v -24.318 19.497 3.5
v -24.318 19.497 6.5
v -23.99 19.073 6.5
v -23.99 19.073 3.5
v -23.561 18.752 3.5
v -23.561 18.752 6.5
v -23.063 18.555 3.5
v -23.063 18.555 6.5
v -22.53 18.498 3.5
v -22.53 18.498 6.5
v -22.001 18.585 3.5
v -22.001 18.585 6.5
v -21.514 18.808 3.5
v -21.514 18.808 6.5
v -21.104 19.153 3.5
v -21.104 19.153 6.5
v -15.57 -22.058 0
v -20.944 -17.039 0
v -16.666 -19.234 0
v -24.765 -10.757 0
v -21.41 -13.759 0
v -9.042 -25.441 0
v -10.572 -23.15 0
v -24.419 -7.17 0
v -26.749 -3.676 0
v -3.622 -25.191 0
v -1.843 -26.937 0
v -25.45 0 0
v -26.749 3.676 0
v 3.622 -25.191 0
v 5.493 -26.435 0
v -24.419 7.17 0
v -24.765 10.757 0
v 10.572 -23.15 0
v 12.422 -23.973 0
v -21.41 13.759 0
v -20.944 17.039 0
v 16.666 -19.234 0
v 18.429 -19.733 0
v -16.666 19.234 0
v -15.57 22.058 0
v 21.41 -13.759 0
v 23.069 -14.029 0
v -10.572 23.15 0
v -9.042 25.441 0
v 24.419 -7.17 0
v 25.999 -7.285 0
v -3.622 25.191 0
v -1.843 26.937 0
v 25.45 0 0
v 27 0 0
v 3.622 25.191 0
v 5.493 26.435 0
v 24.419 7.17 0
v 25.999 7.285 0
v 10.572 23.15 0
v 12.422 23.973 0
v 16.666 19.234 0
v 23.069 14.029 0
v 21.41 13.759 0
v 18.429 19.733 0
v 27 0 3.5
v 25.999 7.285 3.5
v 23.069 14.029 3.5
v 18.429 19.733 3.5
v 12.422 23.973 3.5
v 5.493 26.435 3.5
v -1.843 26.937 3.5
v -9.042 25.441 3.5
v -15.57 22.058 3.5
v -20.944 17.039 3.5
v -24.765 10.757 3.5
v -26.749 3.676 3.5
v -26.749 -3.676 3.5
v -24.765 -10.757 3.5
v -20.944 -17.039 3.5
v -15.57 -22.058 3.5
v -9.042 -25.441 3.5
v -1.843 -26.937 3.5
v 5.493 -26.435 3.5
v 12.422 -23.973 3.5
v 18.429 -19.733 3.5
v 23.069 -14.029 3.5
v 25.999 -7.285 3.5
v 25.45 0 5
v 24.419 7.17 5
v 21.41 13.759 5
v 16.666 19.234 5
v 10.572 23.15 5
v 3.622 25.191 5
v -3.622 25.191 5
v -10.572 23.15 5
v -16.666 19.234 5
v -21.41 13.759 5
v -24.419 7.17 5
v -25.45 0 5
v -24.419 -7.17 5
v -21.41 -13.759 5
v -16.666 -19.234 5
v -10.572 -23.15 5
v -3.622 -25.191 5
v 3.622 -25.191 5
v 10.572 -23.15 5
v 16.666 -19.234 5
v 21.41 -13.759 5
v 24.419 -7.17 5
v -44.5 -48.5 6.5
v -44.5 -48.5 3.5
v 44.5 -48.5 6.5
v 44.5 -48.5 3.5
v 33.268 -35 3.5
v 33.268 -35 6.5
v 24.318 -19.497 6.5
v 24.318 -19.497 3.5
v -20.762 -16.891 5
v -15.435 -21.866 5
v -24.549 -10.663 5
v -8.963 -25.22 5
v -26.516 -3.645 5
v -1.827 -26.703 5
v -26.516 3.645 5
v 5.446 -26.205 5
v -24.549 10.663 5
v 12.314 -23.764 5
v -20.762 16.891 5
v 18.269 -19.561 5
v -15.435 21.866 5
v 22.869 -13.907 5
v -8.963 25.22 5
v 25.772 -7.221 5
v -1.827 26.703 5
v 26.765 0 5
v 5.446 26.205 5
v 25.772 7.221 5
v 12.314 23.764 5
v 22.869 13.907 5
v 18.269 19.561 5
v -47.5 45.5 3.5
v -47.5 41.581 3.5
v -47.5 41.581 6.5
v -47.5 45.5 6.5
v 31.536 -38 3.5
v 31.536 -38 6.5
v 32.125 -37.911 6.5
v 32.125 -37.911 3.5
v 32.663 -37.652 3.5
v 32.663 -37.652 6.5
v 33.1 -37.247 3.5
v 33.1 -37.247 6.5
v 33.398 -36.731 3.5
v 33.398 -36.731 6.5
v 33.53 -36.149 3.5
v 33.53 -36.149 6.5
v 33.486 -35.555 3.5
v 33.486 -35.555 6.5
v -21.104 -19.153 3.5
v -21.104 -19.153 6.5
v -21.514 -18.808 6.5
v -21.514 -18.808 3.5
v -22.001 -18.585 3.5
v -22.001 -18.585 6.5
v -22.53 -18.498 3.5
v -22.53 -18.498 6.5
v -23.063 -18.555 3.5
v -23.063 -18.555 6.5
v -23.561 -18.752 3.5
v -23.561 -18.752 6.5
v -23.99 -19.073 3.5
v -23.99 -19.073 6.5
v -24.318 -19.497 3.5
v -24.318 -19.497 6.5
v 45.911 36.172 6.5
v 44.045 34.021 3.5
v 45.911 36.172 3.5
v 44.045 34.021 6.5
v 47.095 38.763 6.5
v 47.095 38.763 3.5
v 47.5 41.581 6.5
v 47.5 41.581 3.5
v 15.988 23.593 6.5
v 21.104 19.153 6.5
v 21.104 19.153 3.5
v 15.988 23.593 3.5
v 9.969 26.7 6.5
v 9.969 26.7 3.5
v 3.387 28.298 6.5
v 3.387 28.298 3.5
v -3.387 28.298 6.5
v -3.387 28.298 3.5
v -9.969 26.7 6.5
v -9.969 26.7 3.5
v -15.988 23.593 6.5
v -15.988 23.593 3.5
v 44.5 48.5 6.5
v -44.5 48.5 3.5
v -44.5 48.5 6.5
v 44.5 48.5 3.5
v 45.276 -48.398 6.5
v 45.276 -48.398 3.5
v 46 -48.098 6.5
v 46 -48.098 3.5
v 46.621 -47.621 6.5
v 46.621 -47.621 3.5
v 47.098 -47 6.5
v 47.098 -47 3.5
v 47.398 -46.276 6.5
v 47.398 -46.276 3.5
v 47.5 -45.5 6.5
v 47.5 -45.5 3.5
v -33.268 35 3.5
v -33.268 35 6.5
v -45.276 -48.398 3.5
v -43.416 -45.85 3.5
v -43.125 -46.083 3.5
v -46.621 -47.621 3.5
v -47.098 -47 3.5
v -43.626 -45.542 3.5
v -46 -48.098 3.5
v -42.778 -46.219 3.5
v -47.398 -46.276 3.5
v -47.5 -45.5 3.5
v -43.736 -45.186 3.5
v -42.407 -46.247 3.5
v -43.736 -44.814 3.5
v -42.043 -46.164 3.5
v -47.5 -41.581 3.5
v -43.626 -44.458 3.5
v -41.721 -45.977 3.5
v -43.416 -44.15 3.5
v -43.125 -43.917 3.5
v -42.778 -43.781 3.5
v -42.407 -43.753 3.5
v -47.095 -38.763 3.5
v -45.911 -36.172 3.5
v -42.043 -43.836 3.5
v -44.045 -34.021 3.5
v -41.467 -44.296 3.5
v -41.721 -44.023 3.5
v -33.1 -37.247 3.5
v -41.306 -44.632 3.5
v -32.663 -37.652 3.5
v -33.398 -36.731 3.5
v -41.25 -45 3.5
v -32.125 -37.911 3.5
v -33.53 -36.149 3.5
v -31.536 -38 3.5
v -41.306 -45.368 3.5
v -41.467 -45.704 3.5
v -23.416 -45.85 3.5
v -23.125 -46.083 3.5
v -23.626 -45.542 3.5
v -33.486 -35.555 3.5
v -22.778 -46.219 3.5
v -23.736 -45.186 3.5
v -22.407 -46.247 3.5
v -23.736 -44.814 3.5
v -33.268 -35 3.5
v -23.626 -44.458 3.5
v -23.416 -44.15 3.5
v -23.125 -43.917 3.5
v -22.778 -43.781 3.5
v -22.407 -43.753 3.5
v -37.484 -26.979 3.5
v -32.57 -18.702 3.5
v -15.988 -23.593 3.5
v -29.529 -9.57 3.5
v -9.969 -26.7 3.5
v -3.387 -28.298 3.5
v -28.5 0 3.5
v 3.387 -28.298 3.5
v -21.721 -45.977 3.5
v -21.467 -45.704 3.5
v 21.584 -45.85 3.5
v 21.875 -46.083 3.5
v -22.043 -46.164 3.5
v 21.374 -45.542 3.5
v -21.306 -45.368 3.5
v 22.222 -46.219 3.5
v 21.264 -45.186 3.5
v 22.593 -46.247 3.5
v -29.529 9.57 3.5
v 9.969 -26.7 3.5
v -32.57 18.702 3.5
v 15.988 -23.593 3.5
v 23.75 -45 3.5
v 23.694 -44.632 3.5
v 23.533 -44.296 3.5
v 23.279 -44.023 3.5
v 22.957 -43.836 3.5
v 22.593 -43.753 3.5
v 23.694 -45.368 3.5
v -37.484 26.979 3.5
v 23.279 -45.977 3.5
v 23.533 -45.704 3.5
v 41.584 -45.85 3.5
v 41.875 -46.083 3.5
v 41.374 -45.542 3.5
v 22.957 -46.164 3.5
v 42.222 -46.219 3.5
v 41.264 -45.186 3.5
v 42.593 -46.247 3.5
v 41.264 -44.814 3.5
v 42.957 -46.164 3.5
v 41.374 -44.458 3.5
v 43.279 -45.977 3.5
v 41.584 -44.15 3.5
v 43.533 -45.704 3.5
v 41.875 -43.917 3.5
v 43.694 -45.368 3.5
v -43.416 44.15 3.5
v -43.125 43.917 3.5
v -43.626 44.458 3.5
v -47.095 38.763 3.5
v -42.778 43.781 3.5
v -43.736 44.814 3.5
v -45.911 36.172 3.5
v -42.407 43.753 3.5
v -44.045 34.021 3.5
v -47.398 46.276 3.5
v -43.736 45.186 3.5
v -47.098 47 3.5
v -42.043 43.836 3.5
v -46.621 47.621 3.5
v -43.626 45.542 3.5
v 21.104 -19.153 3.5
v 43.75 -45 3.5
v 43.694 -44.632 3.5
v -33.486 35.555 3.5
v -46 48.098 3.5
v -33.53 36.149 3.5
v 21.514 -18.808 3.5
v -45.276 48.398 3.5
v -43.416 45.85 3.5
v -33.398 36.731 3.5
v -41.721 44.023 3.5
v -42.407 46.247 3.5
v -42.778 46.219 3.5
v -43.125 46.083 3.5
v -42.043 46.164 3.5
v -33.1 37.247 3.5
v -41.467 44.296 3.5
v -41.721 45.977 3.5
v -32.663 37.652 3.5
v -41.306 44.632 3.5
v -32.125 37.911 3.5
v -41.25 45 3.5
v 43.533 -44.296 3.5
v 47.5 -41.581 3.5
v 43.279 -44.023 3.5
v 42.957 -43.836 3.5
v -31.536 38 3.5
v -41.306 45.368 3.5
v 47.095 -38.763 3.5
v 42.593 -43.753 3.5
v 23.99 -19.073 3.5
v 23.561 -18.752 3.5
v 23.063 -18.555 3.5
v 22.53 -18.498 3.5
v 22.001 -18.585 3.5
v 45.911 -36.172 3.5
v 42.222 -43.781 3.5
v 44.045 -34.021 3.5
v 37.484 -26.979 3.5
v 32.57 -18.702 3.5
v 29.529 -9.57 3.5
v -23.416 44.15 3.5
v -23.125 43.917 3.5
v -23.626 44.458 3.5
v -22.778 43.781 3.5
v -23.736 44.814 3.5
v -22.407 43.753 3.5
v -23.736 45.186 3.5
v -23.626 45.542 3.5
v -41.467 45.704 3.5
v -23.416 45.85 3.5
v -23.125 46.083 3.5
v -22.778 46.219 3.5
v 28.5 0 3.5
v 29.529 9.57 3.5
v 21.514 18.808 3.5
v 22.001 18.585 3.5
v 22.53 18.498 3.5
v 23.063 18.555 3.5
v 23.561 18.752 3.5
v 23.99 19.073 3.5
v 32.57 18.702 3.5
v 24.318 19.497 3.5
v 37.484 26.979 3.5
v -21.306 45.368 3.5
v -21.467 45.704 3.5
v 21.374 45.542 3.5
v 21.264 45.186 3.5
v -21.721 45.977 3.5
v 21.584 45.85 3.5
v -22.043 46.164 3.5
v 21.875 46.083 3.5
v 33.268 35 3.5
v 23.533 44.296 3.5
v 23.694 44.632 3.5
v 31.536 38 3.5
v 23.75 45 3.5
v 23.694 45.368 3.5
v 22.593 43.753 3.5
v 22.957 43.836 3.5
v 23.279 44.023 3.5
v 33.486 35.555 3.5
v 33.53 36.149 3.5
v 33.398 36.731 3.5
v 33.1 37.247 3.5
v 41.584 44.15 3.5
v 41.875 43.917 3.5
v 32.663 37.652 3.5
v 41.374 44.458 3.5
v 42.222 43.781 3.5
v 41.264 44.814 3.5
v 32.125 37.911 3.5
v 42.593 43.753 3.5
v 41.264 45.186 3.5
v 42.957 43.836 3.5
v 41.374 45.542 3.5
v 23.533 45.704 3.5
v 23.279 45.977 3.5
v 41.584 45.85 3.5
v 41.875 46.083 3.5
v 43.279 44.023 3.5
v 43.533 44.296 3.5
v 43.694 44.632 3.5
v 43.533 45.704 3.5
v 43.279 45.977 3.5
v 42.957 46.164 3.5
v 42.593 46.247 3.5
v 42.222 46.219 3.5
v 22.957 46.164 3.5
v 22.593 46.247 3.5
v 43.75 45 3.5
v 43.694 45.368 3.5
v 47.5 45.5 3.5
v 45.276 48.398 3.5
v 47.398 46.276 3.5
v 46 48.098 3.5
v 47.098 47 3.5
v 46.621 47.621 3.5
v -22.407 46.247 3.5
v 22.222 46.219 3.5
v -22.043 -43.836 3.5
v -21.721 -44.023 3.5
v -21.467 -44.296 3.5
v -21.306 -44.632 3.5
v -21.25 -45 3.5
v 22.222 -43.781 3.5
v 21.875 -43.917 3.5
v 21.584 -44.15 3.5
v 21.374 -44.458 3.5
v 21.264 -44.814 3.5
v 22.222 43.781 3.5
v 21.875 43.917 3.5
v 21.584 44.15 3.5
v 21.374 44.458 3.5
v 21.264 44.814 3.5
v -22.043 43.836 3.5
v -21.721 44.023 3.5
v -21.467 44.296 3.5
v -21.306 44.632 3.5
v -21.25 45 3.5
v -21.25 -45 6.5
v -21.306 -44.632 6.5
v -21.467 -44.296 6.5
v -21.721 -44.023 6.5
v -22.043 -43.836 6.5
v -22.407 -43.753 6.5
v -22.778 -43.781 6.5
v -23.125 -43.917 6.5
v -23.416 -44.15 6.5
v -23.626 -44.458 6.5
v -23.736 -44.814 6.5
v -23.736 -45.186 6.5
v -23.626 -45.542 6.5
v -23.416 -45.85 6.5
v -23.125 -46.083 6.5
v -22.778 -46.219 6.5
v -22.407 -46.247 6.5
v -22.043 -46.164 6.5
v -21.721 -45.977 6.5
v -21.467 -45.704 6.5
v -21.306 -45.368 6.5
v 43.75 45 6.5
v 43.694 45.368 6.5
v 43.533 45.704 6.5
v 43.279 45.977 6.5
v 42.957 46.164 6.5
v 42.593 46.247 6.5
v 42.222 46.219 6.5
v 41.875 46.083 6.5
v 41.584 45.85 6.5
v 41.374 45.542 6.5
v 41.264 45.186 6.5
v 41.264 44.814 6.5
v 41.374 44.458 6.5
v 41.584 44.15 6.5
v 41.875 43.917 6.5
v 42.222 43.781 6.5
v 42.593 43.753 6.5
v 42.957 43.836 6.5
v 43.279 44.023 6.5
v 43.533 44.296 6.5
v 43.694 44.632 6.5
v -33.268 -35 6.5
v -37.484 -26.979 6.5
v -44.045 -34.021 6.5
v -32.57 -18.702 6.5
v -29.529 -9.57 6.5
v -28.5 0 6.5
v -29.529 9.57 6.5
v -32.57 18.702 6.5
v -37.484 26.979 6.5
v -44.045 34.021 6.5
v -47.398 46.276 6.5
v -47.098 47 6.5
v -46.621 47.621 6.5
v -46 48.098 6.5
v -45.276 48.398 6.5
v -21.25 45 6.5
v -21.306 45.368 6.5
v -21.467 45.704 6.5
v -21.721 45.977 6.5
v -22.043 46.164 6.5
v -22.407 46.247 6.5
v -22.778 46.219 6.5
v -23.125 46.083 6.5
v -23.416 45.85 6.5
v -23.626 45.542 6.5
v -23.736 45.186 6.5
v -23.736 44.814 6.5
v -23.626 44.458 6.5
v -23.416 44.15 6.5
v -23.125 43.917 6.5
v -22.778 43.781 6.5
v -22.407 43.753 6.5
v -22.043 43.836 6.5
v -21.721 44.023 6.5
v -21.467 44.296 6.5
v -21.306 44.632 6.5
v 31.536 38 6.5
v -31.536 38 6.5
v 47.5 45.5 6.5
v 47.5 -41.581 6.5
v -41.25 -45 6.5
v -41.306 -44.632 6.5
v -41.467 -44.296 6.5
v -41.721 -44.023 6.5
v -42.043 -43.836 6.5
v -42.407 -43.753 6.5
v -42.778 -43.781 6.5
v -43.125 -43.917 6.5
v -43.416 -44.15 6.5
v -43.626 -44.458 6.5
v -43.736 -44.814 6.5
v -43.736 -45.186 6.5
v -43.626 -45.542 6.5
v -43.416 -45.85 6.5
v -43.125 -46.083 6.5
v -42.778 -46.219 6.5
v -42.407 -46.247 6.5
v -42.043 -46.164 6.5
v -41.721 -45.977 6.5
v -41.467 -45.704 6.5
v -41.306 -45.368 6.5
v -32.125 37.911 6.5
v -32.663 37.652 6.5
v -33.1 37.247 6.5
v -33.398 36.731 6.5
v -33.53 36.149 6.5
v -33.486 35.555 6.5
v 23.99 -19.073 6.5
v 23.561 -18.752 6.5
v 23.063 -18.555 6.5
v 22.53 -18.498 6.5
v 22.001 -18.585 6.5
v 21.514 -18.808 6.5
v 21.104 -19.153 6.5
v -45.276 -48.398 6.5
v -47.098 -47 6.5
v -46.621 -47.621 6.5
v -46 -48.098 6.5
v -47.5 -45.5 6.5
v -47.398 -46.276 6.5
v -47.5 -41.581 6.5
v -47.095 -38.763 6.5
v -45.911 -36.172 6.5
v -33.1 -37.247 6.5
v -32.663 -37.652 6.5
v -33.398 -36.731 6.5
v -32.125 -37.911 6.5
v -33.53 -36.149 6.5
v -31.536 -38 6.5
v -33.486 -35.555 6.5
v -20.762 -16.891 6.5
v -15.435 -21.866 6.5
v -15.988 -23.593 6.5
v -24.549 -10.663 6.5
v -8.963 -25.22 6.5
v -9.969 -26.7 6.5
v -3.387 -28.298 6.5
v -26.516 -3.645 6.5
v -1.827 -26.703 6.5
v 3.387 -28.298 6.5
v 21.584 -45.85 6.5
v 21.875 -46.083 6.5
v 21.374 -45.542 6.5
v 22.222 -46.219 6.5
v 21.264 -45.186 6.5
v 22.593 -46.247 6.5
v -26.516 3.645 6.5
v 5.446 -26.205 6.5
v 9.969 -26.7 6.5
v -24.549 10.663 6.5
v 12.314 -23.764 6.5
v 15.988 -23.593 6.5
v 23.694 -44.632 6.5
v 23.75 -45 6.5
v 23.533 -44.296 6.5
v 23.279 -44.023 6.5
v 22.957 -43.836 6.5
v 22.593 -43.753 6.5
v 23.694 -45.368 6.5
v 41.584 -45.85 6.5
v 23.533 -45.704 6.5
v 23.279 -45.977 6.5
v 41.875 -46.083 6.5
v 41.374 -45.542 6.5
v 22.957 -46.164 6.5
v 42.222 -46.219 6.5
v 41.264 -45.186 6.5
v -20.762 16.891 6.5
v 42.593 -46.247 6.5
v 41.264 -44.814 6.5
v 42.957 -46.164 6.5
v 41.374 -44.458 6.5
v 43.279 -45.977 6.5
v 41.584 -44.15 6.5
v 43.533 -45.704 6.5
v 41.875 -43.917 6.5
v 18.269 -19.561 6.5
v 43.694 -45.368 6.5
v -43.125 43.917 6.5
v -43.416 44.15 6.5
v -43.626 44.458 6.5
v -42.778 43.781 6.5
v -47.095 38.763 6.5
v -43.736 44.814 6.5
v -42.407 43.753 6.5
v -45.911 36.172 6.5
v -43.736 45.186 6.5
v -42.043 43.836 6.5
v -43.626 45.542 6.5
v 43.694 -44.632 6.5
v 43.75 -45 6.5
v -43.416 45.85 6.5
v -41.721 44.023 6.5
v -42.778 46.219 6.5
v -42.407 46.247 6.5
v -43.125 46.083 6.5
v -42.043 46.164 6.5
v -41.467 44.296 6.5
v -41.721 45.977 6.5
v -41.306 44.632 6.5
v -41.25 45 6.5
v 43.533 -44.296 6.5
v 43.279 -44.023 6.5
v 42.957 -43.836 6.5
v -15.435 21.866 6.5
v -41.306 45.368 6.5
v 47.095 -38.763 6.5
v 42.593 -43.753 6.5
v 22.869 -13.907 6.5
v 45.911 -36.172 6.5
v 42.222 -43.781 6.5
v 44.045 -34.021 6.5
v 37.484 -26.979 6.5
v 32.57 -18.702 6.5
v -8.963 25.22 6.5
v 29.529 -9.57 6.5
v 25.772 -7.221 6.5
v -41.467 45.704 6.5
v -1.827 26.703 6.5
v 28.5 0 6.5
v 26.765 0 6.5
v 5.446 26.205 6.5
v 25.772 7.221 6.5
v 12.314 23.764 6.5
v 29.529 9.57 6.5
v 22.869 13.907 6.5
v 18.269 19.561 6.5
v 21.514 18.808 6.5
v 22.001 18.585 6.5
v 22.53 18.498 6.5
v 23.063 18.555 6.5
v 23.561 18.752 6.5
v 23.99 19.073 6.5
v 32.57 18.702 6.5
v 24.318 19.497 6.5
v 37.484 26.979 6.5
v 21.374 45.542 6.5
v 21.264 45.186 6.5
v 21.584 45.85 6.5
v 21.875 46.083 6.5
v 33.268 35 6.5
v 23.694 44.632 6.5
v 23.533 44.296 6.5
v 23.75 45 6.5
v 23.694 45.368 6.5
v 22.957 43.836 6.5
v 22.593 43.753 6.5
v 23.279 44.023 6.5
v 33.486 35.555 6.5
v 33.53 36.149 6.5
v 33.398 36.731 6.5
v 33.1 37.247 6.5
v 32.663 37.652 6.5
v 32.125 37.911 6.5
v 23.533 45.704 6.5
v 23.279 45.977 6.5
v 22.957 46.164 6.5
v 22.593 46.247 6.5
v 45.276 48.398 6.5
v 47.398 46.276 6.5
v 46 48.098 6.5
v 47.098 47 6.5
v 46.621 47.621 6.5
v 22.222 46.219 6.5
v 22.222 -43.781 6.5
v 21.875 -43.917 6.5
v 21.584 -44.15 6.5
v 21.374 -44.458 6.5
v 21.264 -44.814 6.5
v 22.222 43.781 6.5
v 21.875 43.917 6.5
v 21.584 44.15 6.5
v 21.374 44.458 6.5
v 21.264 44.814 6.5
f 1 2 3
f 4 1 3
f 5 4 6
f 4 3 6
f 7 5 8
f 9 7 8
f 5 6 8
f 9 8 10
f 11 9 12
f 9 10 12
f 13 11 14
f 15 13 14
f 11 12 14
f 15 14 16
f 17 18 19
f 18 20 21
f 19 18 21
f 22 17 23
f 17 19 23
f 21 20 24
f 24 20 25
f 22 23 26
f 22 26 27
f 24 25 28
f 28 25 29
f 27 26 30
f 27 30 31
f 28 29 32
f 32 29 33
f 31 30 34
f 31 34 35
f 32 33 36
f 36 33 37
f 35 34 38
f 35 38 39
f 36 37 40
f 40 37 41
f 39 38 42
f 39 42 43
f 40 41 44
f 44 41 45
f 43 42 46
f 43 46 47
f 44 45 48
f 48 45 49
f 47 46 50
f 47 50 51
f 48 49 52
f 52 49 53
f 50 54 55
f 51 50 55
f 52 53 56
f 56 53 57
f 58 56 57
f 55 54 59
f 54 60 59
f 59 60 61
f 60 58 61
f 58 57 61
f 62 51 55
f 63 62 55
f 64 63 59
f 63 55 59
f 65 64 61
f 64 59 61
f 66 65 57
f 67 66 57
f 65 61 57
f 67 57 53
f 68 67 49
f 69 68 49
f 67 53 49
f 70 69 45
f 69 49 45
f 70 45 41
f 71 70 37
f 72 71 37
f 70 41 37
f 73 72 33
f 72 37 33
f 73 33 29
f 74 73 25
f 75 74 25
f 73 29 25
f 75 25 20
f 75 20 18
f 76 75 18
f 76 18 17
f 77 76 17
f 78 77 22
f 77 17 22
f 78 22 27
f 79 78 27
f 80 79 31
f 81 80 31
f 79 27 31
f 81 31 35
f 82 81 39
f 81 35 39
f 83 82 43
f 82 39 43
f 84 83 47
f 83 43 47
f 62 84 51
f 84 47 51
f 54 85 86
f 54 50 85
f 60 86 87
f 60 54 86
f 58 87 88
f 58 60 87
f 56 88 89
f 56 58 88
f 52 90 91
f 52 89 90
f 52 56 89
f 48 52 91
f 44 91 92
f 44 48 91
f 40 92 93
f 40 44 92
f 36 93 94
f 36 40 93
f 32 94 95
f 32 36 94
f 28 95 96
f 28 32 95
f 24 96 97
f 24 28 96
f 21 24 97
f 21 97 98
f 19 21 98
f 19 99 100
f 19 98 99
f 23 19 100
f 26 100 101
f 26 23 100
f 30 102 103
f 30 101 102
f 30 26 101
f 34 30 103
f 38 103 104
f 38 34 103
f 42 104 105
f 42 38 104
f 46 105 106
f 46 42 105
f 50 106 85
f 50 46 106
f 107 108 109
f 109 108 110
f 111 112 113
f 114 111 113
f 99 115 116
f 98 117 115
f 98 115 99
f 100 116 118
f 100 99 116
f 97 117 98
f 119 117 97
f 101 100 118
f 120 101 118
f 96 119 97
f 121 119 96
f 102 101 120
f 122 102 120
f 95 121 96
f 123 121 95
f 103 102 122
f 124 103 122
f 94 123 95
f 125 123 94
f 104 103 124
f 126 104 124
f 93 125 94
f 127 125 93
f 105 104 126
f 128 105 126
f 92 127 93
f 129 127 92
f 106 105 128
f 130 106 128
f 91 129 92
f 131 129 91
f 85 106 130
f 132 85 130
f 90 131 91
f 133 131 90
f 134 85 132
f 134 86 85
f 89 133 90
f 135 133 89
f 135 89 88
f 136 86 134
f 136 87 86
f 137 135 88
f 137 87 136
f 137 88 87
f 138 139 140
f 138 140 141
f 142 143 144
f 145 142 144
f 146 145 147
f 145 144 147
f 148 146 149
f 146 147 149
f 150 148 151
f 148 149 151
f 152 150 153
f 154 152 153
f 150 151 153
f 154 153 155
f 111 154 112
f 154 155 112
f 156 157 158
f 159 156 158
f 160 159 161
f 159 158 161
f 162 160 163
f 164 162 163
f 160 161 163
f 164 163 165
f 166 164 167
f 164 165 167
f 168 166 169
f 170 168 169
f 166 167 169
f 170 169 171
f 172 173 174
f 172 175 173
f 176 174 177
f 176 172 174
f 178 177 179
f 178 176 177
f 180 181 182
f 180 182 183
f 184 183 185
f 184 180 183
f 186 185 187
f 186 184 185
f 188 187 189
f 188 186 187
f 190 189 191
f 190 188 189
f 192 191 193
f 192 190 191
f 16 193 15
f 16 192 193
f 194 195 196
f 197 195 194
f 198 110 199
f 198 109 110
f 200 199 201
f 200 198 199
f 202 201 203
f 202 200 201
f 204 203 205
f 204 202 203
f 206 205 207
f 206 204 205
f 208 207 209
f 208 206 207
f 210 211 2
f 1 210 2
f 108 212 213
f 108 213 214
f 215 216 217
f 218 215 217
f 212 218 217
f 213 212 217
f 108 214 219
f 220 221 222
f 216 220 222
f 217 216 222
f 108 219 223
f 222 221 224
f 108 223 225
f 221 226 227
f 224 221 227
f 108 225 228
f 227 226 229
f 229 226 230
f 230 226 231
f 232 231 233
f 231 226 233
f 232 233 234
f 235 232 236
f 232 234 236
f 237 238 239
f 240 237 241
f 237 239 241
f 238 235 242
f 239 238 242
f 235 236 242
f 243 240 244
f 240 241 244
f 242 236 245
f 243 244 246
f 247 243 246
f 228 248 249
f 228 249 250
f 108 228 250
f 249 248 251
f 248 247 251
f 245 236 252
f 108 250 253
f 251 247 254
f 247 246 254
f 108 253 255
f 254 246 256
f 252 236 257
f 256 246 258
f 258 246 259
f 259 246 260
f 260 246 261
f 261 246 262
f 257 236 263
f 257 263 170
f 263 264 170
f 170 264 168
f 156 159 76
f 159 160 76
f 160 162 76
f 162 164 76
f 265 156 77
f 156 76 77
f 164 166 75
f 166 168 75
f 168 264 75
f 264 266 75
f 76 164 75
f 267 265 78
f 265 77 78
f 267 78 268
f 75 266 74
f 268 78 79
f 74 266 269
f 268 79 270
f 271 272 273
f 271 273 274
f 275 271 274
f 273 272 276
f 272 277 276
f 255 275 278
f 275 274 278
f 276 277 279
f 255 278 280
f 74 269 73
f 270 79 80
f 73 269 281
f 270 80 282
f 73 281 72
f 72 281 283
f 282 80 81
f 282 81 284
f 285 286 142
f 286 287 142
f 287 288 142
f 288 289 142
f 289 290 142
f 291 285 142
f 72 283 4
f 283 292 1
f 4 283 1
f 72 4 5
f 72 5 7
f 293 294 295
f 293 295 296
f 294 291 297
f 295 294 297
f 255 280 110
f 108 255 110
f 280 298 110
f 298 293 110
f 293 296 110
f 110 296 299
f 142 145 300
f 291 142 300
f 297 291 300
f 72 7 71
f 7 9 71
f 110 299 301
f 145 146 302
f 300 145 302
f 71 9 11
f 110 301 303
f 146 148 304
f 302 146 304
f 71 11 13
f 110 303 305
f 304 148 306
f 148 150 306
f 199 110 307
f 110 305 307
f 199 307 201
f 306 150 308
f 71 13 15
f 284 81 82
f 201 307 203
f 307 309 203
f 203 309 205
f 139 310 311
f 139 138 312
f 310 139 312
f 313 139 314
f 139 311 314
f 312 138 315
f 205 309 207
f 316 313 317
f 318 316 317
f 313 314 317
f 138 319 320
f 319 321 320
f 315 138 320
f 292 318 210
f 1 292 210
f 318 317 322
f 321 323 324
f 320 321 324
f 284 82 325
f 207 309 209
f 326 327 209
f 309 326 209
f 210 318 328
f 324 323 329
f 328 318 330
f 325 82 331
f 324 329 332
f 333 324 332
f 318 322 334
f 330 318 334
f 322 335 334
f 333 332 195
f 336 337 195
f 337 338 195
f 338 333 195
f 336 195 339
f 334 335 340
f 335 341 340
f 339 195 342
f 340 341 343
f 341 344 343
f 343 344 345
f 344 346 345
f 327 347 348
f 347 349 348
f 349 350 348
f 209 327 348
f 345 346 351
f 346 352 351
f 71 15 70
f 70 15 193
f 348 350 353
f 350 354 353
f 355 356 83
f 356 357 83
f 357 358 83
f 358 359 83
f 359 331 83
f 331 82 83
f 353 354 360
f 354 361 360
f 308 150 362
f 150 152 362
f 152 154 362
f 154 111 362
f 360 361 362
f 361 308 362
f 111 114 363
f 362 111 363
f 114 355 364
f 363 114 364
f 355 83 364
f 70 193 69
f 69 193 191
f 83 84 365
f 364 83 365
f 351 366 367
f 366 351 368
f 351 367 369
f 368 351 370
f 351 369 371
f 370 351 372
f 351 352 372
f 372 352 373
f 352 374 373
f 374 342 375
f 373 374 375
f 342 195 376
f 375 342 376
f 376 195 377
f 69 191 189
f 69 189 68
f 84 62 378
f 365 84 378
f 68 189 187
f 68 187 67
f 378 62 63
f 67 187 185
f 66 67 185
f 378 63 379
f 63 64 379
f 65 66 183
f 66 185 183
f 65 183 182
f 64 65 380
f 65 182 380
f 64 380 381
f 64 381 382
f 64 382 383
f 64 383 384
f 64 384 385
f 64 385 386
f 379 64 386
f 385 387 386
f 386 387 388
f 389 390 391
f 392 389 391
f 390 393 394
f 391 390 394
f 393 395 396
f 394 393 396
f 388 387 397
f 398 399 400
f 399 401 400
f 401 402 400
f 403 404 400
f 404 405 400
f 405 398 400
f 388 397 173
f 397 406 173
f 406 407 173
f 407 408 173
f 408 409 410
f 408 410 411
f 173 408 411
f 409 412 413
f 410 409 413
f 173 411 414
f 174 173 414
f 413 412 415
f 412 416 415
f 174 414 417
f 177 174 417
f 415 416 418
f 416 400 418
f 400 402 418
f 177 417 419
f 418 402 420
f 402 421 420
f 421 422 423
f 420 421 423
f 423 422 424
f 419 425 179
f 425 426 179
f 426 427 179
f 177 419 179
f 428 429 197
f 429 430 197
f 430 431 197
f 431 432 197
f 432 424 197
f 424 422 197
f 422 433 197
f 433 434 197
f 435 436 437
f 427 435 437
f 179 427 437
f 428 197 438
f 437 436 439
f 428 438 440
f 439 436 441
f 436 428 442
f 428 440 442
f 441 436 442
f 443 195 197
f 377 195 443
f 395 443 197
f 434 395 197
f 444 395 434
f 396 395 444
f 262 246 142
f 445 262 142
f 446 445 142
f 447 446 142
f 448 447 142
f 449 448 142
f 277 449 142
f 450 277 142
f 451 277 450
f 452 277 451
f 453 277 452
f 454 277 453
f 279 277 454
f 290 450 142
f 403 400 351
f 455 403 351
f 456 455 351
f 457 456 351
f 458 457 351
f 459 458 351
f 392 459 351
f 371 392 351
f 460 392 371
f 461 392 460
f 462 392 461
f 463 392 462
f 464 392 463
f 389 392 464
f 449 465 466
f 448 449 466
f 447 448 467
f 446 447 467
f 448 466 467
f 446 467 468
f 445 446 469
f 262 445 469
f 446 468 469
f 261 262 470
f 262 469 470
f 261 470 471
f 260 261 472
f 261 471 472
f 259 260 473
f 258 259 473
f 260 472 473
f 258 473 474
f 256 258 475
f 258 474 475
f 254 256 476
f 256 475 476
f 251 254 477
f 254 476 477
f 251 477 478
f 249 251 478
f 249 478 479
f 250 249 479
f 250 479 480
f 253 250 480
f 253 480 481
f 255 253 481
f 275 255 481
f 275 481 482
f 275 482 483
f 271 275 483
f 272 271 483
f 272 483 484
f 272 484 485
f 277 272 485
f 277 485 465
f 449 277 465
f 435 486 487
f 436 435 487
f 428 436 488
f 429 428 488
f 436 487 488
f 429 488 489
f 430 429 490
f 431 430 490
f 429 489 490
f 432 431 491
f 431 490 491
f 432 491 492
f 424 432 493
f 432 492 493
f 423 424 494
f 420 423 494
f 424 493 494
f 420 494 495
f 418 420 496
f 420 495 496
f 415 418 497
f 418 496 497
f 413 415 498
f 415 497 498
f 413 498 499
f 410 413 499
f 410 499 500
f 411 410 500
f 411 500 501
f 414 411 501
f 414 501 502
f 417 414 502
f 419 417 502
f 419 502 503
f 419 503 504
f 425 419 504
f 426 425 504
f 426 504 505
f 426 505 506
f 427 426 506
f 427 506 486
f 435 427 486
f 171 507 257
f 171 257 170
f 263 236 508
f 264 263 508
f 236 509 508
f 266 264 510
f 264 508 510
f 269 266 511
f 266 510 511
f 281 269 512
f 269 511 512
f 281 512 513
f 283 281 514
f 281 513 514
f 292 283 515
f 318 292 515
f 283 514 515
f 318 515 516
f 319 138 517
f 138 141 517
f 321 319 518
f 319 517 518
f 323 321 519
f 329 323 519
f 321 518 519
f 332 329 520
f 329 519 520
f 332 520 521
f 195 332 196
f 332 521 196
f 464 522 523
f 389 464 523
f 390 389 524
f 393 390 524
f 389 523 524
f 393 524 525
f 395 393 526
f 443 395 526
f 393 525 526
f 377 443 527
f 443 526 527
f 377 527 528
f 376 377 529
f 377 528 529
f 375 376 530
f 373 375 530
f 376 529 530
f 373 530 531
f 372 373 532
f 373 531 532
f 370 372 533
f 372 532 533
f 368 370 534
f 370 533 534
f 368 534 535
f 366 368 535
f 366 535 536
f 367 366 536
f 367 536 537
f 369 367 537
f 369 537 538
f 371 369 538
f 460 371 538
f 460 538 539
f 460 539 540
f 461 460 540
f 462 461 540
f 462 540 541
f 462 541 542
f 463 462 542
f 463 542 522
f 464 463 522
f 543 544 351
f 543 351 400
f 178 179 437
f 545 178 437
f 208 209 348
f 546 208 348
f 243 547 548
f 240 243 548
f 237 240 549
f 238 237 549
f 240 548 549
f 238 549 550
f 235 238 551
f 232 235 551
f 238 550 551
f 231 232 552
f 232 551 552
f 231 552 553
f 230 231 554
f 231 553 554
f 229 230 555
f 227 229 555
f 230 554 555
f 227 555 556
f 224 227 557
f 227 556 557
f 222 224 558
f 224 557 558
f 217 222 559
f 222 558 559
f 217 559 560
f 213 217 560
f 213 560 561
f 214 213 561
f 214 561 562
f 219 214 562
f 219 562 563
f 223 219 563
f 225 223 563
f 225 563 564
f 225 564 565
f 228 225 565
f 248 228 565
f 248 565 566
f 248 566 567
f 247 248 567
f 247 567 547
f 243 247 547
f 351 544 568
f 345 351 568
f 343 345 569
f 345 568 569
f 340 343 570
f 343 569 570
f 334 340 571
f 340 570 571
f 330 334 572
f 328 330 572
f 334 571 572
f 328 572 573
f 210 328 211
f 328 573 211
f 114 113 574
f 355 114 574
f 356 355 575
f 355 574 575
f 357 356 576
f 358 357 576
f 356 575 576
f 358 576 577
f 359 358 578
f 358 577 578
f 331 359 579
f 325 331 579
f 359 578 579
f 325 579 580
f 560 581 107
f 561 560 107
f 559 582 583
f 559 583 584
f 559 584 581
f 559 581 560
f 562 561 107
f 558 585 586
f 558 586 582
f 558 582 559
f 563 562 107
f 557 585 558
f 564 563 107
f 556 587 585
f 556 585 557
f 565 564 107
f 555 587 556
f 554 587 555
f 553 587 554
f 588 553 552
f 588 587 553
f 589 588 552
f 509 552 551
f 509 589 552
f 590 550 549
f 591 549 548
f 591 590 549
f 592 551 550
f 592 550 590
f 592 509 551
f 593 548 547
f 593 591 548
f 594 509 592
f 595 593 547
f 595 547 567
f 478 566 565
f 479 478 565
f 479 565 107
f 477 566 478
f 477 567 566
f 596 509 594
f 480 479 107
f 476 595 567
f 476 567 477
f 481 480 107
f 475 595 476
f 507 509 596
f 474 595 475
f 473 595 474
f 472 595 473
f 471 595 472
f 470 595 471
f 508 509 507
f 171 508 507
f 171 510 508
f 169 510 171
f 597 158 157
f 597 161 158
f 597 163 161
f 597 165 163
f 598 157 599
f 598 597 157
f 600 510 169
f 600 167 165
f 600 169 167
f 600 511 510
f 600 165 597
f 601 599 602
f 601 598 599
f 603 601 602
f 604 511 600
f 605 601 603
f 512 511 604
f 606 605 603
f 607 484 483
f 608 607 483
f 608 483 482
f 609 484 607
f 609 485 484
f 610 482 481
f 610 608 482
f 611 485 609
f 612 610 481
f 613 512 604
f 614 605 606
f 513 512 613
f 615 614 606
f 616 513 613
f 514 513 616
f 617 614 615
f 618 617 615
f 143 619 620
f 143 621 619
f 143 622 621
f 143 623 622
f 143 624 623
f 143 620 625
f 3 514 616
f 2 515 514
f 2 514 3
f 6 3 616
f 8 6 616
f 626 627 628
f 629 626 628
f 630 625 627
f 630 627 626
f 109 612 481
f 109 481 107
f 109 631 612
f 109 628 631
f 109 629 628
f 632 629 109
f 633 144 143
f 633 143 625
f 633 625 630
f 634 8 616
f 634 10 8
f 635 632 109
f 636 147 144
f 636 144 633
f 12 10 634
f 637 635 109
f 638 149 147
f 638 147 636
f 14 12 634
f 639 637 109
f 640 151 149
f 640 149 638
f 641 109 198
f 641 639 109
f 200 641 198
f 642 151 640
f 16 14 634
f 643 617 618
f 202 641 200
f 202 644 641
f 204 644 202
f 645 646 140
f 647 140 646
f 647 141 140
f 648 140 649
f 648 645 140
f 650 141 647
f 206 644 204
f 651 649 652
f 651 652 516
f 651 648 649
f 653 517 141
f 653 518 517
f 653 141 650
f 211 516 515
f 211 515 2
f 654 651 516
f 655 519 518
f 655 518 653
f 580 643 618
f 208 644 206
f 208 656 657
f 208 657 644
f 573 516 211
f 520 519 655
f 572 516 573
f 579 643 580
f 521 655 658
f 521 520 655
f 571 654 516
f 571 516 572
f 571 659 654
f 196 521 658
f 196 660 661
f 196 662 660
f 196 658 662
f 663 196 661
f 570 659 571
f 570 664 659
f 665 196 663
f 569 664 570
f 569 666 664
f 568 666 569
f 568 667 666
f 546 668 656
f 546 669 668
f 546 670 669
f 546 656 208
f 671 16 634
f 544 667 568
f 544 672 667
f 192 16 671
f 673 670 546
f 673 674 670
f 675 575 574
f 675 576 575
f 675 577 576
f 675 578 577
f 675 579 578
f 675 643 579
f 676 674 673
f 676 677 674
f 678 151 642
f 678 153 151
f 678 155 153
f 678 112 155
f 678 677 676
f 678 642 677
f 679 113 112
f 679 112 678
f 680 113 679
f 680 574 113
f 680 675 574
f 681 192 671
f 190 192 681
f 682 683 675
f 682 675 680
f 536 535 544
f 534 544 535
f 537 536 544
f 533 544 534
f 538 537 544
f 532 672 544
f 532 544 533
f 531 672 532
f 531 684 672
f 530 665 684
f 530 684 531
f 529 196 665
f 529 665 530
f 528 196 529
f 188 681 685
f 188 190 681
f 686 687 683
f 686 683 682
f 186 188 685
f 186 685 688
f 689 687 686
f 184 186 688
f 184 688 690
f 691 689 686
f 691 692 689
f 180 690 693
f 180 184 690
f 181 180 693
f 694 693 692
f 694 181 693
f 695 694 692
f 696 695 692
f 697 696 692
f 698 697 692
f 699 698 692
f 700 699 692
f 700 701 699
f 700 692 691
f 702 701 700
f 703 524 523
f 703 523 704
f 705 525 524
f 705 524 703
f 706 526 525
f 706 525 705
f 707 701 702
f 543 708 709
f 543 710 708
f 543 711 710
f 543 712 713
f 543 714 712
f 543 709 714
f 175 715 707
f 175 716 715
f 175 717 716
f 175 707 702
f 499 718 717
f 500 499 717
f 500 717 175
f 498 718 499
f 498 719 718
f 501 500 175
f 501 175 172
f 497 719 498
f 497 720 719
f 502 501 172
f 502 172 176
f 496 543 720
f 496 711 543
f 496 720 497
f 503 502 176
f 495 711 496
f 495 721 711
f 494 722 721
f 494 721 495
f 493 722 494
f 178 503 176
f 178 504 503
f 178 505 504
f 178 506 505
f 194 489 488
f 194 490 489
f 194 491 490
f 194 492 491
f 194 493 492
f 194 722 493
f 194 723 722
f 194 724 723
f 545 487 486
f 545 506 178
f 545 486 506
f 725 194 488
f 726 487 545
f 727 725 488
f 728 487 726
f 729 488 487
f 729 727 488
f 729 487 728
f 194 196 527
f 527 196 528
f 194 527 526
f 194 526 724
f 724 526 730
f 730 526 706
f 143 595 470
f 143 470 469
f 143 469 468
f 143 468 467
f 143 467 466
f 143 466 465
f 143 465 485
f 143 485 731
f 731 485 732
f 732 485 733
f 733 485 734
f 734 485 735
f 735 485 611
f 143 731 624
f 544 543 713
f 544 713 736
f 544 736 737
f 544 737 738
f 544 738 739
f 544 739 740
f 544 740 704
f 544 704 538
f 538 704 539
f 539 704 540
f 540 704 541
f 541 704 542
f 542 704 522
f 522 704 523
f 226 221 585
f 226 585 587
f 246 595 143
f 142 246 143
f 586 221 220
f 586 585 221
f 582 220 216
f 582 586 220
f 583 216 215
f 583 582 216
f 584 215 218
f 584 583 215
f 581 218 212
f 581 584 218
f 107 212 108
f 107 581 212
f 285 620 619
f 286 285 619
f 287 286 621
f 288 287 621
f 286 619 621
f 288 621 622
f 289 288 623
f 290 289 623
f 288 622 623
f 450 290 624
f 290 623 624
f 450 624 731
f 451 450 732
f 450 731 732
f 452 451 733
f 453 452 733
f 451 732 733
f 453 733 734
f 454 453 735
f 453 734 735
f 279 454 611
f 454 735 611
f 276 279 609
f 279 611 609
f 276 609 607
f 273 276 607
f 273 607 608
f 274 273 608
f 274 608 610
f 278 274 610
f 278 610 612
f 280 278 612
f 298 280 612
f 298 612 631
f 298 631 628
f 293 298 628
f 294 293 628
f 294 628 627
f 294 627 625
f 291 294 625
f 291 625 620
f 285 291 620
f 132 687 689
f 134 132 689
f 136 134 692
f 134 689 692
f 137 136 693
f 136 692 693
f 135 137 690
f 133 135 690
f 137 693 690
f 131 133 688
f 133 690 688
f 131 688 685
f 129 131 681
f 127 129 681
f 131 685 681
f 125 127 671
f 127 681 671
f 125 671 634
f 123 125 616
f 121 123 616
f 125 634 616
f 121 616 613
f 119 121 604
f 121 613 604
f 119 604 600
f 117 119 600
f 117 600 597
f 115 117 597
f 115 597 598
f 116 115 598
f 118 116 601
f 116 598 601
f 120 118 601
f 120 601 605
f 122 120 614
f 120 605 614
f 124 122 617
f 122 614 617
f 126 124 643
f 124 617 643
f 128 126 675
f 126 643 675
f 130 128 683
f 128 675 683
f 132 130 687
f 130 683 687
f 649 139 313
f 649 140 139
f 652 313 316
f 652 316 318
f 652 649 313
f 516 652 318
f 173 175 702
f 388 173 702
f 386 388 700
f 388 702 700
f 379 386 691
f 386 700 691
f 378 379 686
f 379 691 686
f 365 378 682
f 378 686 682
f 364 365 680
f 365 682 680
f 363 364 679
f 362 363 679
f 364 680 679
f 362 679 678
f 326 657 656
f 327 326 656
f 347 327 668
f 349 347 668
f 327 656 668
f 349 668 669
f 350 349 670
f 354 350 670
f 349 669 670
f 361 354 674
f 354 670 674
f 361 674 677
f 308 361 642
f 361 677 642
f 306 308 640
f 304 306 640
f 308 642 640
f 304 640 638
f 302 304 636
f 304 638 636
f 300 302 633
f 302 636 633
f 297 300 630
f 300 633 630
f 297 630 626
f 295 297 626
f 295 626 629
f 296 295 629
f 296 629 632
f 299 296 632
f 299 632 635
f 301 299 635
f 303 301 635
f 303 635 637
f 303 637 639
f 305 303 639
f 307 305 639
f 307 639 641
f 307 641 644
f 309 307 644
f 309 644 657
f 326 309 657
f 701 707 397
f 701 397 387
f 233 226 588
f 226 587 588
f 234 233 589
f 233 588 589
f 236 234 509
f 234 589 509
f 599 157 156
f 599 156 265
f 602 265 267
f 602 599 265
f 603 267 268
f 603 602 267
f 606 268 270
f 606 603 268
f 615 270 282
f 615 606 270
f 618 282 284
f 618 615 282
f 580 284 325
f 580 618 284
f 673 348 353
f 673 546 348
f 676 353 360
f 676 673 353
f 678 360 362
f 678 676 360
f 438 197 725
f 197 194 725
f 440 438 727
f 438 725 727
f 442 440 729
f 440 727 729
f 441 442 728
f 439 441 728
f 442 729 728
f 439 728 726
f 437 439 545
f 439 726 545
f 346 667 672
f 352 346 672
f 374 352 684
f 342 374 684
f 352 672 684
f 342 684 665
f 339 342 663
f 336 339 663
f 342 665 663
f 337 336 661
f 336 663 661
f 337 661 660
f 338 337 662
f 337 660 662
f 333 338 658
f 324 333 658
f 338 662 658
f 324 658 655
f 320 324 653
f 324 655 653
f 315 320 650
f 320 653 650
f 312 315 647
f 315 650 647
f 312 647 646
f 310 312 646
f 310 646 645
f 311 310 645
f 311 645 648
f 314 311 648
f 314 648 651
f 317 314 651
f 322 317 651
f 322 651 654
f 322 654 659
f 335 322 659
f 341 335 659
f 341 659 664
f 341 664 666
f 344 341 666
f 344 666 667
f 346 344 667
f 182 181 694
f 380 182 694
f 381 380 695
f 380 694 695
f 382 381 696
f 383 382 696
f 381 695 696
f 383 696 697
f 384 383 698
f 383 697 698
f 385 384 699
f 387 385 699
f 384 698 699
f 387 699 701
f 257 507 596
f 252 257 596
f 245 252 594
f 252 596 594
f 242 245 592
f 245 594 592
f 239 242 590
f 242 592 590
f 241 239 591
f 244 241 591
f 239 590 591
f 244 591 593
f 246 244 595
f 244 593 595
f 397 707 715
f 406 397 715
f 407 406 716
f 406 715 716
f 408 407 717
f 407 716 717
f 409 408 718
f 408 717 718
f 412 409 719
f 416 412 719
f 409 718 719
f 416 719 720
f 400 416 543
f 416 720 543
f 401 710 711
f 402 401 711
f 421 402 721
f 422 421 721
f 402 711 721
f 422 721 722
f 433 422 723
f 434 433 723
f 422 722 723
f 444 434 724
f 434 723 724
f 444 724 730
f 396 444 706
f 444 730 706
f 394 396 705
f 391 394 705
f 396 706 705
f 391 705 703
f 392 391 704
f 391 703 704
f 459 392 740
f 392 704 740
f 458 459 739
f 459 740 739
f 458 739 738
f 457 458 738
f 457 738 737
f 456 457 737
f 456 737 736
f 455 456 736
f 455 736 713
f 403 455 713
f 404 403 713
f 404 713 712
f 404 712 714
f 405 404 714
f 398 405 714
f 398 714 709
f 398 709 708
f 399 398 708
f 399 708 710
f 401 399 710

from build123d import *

# Parameters (mm, degrees)
SKETCH006_R     = 27
SKETCH006_R_2   = 25.45
PAD003_DEPTH    = 3.5
SKETCH007_W     = 95
SKETCH007_H     = 97
SKETCH007_R     = 25.45
PAD004_DEPTH    = 3
SKETCH008_R     = 26.765
POCKET_DEPTH    = 1.5
SKETCH009_R     = 1.25
POCKET001_DEPTH = 6.501
SKETCH010_R     = 45
POCKET002_DEPTH = 6.501
FILLET_R        = 10
FILLET001_R     = 3


with BuildPart() as part:
    # Sketch006 → Pad003 (new body)
    with BuildSketch(Plane.XY):
        Circle(SKETCH006_R)
        Circle(SKETCH006_R_2, mode=Mode.SUBTRACT)
    extrude(amount=PAD003_DEPTH)

    # Sketch007 (on Face4 of Pad003) → Pad004 (join)
    with BuildSketch(Plane.XY.offset(3.5)):
        Rectangle(SKETCH007_W, SKETCH007_H)
        Circle(SKETCH007_R, mode=Mode.SUBTRACT)
    extrude(amount=PAD004_DEPTH)

    # Sketch008 (on Face10 of Pad004) → Pocket (cut)
    with BuildSketch(Plane.XY.offset(6.5)):
        Circle(SKETCH008_R)
    extrude(amount=-POCKET_DEPTH, mode=Mode.SUBTRACT)

    # Sketch009 (on Face10 of Pocket) → Pocket001 (cut, through all)
    with BuildSketch(Plane.XY.offset(6.5)):
        with Locations((-42.5, 45)):
            Circle(SKETCH009_R)
        with Locations((42.5, 45)):
            Circle(SKETCH009_R)
        with Locations((42.5, -45)):
            Circle(SKETCH009_R)
        with Locations((-42.5, -45)):
            Circle(SKETCH009_R)
        with Locations((-22.5, 45)):
            Circle(SKETCH009_R)
        with Locations((22.5, 45)):
            Circle(SKETCH009_R)
        with Locations((-22.5, -45)):
            Circle(SKETCH009_R)
        with Locations((22.5, -45)):
            Circle(SKETCH009_R)
    extrude(amount=-POCKET001_DEPTH, mode=Mode.SUBTRACT)

    # Sketch010 (on Face18 of Pocket001) → Pocket002 (cut, through all)
    with BuildSketch(Plane.XY.offset(6.5)):
        with Locations((-73.5, 0)):
            Circle(SKETCH010_R)
        with Locations((73.5, 0)):
            Circle(SKETCH010_R)
        with BuildLine():
            Line((-31.535898, 38), (31.535898, 38))
            ThreePointArc((33.267949, 35), (33.267949, 37), (31.535898, 38))
            Line((33.267949, 35), (24.317547, 19.497448))
            ThreePointArc((21.10448, 19.153353), (22.798463, 18.508819), (24.317547, 19.497448))
            ThreePointArc((21.10448, 19.153353), (0, 28.5), (-21.10448, 19.153353))
            ThreePointArc((-24.317547, 19.497448), (-22.798463, 18.508819), (-21.10448, 19.153353))
            Line((-33.267949, 35), (-24.317547, 19.497448))
            ThreePointArc((-31.535898, 38), (-33.267949, 37), (-33.267949, 35))
        make_face()
        with BuildLine():
            Line((-31.535898, -38), (31.535898, -38))
            ThreePointArc((31.535898, -38), (33.267949, -37), (33.267949, -35))
            Line((33.267949, -35), (24.317547, -19.497448))
            ThreePointArc((24.317547, -19.497448), (22.798463, -18.508819), (21.10448, -19.153353))
            ThreePointArc((-21.10448, -19.153353), (0, -28.5), (21.10448, -19.153353))
            ThreePointArc((-21.10448, -19.153353), (-22.798463, -18.508819), (-24.317547, -19.497448))
            Line((-33.267949, -35), (-24.317547, -19.497448))
            ThreePointArc((-33.267949, -35), (-33.267949, -37), (-31.535898, -38))
        make_face()
    extrude(amount=-POCKET002_DEPTH, mode=Mode.SUBTRACT)

    # Fillet
    fillet_edges = [part.edges().sort_by_distance(p)[0] for p in [
        (47.5, -36.728735, 5),
        (47.5, 36.728735, 5),
        (-47.5, -36.728735, 5),
        (-47.5, 36.728735, 5),
    ]]
    fillet(fillet_edges, radius=FILLET_R)

    # Fillet001
    fillet001_edges = [part.edges().sort_by_distance(p)[0] for p in [
        (-47.5, 48.5, 5),
        (-47.5, -48.5, 5),
        (47.5, 48.5, 5),
        (47.5, -48.5, 5),
    ]]
    fillet(fillet001_edges, radius=FILLET001_R)


solid = part.part
